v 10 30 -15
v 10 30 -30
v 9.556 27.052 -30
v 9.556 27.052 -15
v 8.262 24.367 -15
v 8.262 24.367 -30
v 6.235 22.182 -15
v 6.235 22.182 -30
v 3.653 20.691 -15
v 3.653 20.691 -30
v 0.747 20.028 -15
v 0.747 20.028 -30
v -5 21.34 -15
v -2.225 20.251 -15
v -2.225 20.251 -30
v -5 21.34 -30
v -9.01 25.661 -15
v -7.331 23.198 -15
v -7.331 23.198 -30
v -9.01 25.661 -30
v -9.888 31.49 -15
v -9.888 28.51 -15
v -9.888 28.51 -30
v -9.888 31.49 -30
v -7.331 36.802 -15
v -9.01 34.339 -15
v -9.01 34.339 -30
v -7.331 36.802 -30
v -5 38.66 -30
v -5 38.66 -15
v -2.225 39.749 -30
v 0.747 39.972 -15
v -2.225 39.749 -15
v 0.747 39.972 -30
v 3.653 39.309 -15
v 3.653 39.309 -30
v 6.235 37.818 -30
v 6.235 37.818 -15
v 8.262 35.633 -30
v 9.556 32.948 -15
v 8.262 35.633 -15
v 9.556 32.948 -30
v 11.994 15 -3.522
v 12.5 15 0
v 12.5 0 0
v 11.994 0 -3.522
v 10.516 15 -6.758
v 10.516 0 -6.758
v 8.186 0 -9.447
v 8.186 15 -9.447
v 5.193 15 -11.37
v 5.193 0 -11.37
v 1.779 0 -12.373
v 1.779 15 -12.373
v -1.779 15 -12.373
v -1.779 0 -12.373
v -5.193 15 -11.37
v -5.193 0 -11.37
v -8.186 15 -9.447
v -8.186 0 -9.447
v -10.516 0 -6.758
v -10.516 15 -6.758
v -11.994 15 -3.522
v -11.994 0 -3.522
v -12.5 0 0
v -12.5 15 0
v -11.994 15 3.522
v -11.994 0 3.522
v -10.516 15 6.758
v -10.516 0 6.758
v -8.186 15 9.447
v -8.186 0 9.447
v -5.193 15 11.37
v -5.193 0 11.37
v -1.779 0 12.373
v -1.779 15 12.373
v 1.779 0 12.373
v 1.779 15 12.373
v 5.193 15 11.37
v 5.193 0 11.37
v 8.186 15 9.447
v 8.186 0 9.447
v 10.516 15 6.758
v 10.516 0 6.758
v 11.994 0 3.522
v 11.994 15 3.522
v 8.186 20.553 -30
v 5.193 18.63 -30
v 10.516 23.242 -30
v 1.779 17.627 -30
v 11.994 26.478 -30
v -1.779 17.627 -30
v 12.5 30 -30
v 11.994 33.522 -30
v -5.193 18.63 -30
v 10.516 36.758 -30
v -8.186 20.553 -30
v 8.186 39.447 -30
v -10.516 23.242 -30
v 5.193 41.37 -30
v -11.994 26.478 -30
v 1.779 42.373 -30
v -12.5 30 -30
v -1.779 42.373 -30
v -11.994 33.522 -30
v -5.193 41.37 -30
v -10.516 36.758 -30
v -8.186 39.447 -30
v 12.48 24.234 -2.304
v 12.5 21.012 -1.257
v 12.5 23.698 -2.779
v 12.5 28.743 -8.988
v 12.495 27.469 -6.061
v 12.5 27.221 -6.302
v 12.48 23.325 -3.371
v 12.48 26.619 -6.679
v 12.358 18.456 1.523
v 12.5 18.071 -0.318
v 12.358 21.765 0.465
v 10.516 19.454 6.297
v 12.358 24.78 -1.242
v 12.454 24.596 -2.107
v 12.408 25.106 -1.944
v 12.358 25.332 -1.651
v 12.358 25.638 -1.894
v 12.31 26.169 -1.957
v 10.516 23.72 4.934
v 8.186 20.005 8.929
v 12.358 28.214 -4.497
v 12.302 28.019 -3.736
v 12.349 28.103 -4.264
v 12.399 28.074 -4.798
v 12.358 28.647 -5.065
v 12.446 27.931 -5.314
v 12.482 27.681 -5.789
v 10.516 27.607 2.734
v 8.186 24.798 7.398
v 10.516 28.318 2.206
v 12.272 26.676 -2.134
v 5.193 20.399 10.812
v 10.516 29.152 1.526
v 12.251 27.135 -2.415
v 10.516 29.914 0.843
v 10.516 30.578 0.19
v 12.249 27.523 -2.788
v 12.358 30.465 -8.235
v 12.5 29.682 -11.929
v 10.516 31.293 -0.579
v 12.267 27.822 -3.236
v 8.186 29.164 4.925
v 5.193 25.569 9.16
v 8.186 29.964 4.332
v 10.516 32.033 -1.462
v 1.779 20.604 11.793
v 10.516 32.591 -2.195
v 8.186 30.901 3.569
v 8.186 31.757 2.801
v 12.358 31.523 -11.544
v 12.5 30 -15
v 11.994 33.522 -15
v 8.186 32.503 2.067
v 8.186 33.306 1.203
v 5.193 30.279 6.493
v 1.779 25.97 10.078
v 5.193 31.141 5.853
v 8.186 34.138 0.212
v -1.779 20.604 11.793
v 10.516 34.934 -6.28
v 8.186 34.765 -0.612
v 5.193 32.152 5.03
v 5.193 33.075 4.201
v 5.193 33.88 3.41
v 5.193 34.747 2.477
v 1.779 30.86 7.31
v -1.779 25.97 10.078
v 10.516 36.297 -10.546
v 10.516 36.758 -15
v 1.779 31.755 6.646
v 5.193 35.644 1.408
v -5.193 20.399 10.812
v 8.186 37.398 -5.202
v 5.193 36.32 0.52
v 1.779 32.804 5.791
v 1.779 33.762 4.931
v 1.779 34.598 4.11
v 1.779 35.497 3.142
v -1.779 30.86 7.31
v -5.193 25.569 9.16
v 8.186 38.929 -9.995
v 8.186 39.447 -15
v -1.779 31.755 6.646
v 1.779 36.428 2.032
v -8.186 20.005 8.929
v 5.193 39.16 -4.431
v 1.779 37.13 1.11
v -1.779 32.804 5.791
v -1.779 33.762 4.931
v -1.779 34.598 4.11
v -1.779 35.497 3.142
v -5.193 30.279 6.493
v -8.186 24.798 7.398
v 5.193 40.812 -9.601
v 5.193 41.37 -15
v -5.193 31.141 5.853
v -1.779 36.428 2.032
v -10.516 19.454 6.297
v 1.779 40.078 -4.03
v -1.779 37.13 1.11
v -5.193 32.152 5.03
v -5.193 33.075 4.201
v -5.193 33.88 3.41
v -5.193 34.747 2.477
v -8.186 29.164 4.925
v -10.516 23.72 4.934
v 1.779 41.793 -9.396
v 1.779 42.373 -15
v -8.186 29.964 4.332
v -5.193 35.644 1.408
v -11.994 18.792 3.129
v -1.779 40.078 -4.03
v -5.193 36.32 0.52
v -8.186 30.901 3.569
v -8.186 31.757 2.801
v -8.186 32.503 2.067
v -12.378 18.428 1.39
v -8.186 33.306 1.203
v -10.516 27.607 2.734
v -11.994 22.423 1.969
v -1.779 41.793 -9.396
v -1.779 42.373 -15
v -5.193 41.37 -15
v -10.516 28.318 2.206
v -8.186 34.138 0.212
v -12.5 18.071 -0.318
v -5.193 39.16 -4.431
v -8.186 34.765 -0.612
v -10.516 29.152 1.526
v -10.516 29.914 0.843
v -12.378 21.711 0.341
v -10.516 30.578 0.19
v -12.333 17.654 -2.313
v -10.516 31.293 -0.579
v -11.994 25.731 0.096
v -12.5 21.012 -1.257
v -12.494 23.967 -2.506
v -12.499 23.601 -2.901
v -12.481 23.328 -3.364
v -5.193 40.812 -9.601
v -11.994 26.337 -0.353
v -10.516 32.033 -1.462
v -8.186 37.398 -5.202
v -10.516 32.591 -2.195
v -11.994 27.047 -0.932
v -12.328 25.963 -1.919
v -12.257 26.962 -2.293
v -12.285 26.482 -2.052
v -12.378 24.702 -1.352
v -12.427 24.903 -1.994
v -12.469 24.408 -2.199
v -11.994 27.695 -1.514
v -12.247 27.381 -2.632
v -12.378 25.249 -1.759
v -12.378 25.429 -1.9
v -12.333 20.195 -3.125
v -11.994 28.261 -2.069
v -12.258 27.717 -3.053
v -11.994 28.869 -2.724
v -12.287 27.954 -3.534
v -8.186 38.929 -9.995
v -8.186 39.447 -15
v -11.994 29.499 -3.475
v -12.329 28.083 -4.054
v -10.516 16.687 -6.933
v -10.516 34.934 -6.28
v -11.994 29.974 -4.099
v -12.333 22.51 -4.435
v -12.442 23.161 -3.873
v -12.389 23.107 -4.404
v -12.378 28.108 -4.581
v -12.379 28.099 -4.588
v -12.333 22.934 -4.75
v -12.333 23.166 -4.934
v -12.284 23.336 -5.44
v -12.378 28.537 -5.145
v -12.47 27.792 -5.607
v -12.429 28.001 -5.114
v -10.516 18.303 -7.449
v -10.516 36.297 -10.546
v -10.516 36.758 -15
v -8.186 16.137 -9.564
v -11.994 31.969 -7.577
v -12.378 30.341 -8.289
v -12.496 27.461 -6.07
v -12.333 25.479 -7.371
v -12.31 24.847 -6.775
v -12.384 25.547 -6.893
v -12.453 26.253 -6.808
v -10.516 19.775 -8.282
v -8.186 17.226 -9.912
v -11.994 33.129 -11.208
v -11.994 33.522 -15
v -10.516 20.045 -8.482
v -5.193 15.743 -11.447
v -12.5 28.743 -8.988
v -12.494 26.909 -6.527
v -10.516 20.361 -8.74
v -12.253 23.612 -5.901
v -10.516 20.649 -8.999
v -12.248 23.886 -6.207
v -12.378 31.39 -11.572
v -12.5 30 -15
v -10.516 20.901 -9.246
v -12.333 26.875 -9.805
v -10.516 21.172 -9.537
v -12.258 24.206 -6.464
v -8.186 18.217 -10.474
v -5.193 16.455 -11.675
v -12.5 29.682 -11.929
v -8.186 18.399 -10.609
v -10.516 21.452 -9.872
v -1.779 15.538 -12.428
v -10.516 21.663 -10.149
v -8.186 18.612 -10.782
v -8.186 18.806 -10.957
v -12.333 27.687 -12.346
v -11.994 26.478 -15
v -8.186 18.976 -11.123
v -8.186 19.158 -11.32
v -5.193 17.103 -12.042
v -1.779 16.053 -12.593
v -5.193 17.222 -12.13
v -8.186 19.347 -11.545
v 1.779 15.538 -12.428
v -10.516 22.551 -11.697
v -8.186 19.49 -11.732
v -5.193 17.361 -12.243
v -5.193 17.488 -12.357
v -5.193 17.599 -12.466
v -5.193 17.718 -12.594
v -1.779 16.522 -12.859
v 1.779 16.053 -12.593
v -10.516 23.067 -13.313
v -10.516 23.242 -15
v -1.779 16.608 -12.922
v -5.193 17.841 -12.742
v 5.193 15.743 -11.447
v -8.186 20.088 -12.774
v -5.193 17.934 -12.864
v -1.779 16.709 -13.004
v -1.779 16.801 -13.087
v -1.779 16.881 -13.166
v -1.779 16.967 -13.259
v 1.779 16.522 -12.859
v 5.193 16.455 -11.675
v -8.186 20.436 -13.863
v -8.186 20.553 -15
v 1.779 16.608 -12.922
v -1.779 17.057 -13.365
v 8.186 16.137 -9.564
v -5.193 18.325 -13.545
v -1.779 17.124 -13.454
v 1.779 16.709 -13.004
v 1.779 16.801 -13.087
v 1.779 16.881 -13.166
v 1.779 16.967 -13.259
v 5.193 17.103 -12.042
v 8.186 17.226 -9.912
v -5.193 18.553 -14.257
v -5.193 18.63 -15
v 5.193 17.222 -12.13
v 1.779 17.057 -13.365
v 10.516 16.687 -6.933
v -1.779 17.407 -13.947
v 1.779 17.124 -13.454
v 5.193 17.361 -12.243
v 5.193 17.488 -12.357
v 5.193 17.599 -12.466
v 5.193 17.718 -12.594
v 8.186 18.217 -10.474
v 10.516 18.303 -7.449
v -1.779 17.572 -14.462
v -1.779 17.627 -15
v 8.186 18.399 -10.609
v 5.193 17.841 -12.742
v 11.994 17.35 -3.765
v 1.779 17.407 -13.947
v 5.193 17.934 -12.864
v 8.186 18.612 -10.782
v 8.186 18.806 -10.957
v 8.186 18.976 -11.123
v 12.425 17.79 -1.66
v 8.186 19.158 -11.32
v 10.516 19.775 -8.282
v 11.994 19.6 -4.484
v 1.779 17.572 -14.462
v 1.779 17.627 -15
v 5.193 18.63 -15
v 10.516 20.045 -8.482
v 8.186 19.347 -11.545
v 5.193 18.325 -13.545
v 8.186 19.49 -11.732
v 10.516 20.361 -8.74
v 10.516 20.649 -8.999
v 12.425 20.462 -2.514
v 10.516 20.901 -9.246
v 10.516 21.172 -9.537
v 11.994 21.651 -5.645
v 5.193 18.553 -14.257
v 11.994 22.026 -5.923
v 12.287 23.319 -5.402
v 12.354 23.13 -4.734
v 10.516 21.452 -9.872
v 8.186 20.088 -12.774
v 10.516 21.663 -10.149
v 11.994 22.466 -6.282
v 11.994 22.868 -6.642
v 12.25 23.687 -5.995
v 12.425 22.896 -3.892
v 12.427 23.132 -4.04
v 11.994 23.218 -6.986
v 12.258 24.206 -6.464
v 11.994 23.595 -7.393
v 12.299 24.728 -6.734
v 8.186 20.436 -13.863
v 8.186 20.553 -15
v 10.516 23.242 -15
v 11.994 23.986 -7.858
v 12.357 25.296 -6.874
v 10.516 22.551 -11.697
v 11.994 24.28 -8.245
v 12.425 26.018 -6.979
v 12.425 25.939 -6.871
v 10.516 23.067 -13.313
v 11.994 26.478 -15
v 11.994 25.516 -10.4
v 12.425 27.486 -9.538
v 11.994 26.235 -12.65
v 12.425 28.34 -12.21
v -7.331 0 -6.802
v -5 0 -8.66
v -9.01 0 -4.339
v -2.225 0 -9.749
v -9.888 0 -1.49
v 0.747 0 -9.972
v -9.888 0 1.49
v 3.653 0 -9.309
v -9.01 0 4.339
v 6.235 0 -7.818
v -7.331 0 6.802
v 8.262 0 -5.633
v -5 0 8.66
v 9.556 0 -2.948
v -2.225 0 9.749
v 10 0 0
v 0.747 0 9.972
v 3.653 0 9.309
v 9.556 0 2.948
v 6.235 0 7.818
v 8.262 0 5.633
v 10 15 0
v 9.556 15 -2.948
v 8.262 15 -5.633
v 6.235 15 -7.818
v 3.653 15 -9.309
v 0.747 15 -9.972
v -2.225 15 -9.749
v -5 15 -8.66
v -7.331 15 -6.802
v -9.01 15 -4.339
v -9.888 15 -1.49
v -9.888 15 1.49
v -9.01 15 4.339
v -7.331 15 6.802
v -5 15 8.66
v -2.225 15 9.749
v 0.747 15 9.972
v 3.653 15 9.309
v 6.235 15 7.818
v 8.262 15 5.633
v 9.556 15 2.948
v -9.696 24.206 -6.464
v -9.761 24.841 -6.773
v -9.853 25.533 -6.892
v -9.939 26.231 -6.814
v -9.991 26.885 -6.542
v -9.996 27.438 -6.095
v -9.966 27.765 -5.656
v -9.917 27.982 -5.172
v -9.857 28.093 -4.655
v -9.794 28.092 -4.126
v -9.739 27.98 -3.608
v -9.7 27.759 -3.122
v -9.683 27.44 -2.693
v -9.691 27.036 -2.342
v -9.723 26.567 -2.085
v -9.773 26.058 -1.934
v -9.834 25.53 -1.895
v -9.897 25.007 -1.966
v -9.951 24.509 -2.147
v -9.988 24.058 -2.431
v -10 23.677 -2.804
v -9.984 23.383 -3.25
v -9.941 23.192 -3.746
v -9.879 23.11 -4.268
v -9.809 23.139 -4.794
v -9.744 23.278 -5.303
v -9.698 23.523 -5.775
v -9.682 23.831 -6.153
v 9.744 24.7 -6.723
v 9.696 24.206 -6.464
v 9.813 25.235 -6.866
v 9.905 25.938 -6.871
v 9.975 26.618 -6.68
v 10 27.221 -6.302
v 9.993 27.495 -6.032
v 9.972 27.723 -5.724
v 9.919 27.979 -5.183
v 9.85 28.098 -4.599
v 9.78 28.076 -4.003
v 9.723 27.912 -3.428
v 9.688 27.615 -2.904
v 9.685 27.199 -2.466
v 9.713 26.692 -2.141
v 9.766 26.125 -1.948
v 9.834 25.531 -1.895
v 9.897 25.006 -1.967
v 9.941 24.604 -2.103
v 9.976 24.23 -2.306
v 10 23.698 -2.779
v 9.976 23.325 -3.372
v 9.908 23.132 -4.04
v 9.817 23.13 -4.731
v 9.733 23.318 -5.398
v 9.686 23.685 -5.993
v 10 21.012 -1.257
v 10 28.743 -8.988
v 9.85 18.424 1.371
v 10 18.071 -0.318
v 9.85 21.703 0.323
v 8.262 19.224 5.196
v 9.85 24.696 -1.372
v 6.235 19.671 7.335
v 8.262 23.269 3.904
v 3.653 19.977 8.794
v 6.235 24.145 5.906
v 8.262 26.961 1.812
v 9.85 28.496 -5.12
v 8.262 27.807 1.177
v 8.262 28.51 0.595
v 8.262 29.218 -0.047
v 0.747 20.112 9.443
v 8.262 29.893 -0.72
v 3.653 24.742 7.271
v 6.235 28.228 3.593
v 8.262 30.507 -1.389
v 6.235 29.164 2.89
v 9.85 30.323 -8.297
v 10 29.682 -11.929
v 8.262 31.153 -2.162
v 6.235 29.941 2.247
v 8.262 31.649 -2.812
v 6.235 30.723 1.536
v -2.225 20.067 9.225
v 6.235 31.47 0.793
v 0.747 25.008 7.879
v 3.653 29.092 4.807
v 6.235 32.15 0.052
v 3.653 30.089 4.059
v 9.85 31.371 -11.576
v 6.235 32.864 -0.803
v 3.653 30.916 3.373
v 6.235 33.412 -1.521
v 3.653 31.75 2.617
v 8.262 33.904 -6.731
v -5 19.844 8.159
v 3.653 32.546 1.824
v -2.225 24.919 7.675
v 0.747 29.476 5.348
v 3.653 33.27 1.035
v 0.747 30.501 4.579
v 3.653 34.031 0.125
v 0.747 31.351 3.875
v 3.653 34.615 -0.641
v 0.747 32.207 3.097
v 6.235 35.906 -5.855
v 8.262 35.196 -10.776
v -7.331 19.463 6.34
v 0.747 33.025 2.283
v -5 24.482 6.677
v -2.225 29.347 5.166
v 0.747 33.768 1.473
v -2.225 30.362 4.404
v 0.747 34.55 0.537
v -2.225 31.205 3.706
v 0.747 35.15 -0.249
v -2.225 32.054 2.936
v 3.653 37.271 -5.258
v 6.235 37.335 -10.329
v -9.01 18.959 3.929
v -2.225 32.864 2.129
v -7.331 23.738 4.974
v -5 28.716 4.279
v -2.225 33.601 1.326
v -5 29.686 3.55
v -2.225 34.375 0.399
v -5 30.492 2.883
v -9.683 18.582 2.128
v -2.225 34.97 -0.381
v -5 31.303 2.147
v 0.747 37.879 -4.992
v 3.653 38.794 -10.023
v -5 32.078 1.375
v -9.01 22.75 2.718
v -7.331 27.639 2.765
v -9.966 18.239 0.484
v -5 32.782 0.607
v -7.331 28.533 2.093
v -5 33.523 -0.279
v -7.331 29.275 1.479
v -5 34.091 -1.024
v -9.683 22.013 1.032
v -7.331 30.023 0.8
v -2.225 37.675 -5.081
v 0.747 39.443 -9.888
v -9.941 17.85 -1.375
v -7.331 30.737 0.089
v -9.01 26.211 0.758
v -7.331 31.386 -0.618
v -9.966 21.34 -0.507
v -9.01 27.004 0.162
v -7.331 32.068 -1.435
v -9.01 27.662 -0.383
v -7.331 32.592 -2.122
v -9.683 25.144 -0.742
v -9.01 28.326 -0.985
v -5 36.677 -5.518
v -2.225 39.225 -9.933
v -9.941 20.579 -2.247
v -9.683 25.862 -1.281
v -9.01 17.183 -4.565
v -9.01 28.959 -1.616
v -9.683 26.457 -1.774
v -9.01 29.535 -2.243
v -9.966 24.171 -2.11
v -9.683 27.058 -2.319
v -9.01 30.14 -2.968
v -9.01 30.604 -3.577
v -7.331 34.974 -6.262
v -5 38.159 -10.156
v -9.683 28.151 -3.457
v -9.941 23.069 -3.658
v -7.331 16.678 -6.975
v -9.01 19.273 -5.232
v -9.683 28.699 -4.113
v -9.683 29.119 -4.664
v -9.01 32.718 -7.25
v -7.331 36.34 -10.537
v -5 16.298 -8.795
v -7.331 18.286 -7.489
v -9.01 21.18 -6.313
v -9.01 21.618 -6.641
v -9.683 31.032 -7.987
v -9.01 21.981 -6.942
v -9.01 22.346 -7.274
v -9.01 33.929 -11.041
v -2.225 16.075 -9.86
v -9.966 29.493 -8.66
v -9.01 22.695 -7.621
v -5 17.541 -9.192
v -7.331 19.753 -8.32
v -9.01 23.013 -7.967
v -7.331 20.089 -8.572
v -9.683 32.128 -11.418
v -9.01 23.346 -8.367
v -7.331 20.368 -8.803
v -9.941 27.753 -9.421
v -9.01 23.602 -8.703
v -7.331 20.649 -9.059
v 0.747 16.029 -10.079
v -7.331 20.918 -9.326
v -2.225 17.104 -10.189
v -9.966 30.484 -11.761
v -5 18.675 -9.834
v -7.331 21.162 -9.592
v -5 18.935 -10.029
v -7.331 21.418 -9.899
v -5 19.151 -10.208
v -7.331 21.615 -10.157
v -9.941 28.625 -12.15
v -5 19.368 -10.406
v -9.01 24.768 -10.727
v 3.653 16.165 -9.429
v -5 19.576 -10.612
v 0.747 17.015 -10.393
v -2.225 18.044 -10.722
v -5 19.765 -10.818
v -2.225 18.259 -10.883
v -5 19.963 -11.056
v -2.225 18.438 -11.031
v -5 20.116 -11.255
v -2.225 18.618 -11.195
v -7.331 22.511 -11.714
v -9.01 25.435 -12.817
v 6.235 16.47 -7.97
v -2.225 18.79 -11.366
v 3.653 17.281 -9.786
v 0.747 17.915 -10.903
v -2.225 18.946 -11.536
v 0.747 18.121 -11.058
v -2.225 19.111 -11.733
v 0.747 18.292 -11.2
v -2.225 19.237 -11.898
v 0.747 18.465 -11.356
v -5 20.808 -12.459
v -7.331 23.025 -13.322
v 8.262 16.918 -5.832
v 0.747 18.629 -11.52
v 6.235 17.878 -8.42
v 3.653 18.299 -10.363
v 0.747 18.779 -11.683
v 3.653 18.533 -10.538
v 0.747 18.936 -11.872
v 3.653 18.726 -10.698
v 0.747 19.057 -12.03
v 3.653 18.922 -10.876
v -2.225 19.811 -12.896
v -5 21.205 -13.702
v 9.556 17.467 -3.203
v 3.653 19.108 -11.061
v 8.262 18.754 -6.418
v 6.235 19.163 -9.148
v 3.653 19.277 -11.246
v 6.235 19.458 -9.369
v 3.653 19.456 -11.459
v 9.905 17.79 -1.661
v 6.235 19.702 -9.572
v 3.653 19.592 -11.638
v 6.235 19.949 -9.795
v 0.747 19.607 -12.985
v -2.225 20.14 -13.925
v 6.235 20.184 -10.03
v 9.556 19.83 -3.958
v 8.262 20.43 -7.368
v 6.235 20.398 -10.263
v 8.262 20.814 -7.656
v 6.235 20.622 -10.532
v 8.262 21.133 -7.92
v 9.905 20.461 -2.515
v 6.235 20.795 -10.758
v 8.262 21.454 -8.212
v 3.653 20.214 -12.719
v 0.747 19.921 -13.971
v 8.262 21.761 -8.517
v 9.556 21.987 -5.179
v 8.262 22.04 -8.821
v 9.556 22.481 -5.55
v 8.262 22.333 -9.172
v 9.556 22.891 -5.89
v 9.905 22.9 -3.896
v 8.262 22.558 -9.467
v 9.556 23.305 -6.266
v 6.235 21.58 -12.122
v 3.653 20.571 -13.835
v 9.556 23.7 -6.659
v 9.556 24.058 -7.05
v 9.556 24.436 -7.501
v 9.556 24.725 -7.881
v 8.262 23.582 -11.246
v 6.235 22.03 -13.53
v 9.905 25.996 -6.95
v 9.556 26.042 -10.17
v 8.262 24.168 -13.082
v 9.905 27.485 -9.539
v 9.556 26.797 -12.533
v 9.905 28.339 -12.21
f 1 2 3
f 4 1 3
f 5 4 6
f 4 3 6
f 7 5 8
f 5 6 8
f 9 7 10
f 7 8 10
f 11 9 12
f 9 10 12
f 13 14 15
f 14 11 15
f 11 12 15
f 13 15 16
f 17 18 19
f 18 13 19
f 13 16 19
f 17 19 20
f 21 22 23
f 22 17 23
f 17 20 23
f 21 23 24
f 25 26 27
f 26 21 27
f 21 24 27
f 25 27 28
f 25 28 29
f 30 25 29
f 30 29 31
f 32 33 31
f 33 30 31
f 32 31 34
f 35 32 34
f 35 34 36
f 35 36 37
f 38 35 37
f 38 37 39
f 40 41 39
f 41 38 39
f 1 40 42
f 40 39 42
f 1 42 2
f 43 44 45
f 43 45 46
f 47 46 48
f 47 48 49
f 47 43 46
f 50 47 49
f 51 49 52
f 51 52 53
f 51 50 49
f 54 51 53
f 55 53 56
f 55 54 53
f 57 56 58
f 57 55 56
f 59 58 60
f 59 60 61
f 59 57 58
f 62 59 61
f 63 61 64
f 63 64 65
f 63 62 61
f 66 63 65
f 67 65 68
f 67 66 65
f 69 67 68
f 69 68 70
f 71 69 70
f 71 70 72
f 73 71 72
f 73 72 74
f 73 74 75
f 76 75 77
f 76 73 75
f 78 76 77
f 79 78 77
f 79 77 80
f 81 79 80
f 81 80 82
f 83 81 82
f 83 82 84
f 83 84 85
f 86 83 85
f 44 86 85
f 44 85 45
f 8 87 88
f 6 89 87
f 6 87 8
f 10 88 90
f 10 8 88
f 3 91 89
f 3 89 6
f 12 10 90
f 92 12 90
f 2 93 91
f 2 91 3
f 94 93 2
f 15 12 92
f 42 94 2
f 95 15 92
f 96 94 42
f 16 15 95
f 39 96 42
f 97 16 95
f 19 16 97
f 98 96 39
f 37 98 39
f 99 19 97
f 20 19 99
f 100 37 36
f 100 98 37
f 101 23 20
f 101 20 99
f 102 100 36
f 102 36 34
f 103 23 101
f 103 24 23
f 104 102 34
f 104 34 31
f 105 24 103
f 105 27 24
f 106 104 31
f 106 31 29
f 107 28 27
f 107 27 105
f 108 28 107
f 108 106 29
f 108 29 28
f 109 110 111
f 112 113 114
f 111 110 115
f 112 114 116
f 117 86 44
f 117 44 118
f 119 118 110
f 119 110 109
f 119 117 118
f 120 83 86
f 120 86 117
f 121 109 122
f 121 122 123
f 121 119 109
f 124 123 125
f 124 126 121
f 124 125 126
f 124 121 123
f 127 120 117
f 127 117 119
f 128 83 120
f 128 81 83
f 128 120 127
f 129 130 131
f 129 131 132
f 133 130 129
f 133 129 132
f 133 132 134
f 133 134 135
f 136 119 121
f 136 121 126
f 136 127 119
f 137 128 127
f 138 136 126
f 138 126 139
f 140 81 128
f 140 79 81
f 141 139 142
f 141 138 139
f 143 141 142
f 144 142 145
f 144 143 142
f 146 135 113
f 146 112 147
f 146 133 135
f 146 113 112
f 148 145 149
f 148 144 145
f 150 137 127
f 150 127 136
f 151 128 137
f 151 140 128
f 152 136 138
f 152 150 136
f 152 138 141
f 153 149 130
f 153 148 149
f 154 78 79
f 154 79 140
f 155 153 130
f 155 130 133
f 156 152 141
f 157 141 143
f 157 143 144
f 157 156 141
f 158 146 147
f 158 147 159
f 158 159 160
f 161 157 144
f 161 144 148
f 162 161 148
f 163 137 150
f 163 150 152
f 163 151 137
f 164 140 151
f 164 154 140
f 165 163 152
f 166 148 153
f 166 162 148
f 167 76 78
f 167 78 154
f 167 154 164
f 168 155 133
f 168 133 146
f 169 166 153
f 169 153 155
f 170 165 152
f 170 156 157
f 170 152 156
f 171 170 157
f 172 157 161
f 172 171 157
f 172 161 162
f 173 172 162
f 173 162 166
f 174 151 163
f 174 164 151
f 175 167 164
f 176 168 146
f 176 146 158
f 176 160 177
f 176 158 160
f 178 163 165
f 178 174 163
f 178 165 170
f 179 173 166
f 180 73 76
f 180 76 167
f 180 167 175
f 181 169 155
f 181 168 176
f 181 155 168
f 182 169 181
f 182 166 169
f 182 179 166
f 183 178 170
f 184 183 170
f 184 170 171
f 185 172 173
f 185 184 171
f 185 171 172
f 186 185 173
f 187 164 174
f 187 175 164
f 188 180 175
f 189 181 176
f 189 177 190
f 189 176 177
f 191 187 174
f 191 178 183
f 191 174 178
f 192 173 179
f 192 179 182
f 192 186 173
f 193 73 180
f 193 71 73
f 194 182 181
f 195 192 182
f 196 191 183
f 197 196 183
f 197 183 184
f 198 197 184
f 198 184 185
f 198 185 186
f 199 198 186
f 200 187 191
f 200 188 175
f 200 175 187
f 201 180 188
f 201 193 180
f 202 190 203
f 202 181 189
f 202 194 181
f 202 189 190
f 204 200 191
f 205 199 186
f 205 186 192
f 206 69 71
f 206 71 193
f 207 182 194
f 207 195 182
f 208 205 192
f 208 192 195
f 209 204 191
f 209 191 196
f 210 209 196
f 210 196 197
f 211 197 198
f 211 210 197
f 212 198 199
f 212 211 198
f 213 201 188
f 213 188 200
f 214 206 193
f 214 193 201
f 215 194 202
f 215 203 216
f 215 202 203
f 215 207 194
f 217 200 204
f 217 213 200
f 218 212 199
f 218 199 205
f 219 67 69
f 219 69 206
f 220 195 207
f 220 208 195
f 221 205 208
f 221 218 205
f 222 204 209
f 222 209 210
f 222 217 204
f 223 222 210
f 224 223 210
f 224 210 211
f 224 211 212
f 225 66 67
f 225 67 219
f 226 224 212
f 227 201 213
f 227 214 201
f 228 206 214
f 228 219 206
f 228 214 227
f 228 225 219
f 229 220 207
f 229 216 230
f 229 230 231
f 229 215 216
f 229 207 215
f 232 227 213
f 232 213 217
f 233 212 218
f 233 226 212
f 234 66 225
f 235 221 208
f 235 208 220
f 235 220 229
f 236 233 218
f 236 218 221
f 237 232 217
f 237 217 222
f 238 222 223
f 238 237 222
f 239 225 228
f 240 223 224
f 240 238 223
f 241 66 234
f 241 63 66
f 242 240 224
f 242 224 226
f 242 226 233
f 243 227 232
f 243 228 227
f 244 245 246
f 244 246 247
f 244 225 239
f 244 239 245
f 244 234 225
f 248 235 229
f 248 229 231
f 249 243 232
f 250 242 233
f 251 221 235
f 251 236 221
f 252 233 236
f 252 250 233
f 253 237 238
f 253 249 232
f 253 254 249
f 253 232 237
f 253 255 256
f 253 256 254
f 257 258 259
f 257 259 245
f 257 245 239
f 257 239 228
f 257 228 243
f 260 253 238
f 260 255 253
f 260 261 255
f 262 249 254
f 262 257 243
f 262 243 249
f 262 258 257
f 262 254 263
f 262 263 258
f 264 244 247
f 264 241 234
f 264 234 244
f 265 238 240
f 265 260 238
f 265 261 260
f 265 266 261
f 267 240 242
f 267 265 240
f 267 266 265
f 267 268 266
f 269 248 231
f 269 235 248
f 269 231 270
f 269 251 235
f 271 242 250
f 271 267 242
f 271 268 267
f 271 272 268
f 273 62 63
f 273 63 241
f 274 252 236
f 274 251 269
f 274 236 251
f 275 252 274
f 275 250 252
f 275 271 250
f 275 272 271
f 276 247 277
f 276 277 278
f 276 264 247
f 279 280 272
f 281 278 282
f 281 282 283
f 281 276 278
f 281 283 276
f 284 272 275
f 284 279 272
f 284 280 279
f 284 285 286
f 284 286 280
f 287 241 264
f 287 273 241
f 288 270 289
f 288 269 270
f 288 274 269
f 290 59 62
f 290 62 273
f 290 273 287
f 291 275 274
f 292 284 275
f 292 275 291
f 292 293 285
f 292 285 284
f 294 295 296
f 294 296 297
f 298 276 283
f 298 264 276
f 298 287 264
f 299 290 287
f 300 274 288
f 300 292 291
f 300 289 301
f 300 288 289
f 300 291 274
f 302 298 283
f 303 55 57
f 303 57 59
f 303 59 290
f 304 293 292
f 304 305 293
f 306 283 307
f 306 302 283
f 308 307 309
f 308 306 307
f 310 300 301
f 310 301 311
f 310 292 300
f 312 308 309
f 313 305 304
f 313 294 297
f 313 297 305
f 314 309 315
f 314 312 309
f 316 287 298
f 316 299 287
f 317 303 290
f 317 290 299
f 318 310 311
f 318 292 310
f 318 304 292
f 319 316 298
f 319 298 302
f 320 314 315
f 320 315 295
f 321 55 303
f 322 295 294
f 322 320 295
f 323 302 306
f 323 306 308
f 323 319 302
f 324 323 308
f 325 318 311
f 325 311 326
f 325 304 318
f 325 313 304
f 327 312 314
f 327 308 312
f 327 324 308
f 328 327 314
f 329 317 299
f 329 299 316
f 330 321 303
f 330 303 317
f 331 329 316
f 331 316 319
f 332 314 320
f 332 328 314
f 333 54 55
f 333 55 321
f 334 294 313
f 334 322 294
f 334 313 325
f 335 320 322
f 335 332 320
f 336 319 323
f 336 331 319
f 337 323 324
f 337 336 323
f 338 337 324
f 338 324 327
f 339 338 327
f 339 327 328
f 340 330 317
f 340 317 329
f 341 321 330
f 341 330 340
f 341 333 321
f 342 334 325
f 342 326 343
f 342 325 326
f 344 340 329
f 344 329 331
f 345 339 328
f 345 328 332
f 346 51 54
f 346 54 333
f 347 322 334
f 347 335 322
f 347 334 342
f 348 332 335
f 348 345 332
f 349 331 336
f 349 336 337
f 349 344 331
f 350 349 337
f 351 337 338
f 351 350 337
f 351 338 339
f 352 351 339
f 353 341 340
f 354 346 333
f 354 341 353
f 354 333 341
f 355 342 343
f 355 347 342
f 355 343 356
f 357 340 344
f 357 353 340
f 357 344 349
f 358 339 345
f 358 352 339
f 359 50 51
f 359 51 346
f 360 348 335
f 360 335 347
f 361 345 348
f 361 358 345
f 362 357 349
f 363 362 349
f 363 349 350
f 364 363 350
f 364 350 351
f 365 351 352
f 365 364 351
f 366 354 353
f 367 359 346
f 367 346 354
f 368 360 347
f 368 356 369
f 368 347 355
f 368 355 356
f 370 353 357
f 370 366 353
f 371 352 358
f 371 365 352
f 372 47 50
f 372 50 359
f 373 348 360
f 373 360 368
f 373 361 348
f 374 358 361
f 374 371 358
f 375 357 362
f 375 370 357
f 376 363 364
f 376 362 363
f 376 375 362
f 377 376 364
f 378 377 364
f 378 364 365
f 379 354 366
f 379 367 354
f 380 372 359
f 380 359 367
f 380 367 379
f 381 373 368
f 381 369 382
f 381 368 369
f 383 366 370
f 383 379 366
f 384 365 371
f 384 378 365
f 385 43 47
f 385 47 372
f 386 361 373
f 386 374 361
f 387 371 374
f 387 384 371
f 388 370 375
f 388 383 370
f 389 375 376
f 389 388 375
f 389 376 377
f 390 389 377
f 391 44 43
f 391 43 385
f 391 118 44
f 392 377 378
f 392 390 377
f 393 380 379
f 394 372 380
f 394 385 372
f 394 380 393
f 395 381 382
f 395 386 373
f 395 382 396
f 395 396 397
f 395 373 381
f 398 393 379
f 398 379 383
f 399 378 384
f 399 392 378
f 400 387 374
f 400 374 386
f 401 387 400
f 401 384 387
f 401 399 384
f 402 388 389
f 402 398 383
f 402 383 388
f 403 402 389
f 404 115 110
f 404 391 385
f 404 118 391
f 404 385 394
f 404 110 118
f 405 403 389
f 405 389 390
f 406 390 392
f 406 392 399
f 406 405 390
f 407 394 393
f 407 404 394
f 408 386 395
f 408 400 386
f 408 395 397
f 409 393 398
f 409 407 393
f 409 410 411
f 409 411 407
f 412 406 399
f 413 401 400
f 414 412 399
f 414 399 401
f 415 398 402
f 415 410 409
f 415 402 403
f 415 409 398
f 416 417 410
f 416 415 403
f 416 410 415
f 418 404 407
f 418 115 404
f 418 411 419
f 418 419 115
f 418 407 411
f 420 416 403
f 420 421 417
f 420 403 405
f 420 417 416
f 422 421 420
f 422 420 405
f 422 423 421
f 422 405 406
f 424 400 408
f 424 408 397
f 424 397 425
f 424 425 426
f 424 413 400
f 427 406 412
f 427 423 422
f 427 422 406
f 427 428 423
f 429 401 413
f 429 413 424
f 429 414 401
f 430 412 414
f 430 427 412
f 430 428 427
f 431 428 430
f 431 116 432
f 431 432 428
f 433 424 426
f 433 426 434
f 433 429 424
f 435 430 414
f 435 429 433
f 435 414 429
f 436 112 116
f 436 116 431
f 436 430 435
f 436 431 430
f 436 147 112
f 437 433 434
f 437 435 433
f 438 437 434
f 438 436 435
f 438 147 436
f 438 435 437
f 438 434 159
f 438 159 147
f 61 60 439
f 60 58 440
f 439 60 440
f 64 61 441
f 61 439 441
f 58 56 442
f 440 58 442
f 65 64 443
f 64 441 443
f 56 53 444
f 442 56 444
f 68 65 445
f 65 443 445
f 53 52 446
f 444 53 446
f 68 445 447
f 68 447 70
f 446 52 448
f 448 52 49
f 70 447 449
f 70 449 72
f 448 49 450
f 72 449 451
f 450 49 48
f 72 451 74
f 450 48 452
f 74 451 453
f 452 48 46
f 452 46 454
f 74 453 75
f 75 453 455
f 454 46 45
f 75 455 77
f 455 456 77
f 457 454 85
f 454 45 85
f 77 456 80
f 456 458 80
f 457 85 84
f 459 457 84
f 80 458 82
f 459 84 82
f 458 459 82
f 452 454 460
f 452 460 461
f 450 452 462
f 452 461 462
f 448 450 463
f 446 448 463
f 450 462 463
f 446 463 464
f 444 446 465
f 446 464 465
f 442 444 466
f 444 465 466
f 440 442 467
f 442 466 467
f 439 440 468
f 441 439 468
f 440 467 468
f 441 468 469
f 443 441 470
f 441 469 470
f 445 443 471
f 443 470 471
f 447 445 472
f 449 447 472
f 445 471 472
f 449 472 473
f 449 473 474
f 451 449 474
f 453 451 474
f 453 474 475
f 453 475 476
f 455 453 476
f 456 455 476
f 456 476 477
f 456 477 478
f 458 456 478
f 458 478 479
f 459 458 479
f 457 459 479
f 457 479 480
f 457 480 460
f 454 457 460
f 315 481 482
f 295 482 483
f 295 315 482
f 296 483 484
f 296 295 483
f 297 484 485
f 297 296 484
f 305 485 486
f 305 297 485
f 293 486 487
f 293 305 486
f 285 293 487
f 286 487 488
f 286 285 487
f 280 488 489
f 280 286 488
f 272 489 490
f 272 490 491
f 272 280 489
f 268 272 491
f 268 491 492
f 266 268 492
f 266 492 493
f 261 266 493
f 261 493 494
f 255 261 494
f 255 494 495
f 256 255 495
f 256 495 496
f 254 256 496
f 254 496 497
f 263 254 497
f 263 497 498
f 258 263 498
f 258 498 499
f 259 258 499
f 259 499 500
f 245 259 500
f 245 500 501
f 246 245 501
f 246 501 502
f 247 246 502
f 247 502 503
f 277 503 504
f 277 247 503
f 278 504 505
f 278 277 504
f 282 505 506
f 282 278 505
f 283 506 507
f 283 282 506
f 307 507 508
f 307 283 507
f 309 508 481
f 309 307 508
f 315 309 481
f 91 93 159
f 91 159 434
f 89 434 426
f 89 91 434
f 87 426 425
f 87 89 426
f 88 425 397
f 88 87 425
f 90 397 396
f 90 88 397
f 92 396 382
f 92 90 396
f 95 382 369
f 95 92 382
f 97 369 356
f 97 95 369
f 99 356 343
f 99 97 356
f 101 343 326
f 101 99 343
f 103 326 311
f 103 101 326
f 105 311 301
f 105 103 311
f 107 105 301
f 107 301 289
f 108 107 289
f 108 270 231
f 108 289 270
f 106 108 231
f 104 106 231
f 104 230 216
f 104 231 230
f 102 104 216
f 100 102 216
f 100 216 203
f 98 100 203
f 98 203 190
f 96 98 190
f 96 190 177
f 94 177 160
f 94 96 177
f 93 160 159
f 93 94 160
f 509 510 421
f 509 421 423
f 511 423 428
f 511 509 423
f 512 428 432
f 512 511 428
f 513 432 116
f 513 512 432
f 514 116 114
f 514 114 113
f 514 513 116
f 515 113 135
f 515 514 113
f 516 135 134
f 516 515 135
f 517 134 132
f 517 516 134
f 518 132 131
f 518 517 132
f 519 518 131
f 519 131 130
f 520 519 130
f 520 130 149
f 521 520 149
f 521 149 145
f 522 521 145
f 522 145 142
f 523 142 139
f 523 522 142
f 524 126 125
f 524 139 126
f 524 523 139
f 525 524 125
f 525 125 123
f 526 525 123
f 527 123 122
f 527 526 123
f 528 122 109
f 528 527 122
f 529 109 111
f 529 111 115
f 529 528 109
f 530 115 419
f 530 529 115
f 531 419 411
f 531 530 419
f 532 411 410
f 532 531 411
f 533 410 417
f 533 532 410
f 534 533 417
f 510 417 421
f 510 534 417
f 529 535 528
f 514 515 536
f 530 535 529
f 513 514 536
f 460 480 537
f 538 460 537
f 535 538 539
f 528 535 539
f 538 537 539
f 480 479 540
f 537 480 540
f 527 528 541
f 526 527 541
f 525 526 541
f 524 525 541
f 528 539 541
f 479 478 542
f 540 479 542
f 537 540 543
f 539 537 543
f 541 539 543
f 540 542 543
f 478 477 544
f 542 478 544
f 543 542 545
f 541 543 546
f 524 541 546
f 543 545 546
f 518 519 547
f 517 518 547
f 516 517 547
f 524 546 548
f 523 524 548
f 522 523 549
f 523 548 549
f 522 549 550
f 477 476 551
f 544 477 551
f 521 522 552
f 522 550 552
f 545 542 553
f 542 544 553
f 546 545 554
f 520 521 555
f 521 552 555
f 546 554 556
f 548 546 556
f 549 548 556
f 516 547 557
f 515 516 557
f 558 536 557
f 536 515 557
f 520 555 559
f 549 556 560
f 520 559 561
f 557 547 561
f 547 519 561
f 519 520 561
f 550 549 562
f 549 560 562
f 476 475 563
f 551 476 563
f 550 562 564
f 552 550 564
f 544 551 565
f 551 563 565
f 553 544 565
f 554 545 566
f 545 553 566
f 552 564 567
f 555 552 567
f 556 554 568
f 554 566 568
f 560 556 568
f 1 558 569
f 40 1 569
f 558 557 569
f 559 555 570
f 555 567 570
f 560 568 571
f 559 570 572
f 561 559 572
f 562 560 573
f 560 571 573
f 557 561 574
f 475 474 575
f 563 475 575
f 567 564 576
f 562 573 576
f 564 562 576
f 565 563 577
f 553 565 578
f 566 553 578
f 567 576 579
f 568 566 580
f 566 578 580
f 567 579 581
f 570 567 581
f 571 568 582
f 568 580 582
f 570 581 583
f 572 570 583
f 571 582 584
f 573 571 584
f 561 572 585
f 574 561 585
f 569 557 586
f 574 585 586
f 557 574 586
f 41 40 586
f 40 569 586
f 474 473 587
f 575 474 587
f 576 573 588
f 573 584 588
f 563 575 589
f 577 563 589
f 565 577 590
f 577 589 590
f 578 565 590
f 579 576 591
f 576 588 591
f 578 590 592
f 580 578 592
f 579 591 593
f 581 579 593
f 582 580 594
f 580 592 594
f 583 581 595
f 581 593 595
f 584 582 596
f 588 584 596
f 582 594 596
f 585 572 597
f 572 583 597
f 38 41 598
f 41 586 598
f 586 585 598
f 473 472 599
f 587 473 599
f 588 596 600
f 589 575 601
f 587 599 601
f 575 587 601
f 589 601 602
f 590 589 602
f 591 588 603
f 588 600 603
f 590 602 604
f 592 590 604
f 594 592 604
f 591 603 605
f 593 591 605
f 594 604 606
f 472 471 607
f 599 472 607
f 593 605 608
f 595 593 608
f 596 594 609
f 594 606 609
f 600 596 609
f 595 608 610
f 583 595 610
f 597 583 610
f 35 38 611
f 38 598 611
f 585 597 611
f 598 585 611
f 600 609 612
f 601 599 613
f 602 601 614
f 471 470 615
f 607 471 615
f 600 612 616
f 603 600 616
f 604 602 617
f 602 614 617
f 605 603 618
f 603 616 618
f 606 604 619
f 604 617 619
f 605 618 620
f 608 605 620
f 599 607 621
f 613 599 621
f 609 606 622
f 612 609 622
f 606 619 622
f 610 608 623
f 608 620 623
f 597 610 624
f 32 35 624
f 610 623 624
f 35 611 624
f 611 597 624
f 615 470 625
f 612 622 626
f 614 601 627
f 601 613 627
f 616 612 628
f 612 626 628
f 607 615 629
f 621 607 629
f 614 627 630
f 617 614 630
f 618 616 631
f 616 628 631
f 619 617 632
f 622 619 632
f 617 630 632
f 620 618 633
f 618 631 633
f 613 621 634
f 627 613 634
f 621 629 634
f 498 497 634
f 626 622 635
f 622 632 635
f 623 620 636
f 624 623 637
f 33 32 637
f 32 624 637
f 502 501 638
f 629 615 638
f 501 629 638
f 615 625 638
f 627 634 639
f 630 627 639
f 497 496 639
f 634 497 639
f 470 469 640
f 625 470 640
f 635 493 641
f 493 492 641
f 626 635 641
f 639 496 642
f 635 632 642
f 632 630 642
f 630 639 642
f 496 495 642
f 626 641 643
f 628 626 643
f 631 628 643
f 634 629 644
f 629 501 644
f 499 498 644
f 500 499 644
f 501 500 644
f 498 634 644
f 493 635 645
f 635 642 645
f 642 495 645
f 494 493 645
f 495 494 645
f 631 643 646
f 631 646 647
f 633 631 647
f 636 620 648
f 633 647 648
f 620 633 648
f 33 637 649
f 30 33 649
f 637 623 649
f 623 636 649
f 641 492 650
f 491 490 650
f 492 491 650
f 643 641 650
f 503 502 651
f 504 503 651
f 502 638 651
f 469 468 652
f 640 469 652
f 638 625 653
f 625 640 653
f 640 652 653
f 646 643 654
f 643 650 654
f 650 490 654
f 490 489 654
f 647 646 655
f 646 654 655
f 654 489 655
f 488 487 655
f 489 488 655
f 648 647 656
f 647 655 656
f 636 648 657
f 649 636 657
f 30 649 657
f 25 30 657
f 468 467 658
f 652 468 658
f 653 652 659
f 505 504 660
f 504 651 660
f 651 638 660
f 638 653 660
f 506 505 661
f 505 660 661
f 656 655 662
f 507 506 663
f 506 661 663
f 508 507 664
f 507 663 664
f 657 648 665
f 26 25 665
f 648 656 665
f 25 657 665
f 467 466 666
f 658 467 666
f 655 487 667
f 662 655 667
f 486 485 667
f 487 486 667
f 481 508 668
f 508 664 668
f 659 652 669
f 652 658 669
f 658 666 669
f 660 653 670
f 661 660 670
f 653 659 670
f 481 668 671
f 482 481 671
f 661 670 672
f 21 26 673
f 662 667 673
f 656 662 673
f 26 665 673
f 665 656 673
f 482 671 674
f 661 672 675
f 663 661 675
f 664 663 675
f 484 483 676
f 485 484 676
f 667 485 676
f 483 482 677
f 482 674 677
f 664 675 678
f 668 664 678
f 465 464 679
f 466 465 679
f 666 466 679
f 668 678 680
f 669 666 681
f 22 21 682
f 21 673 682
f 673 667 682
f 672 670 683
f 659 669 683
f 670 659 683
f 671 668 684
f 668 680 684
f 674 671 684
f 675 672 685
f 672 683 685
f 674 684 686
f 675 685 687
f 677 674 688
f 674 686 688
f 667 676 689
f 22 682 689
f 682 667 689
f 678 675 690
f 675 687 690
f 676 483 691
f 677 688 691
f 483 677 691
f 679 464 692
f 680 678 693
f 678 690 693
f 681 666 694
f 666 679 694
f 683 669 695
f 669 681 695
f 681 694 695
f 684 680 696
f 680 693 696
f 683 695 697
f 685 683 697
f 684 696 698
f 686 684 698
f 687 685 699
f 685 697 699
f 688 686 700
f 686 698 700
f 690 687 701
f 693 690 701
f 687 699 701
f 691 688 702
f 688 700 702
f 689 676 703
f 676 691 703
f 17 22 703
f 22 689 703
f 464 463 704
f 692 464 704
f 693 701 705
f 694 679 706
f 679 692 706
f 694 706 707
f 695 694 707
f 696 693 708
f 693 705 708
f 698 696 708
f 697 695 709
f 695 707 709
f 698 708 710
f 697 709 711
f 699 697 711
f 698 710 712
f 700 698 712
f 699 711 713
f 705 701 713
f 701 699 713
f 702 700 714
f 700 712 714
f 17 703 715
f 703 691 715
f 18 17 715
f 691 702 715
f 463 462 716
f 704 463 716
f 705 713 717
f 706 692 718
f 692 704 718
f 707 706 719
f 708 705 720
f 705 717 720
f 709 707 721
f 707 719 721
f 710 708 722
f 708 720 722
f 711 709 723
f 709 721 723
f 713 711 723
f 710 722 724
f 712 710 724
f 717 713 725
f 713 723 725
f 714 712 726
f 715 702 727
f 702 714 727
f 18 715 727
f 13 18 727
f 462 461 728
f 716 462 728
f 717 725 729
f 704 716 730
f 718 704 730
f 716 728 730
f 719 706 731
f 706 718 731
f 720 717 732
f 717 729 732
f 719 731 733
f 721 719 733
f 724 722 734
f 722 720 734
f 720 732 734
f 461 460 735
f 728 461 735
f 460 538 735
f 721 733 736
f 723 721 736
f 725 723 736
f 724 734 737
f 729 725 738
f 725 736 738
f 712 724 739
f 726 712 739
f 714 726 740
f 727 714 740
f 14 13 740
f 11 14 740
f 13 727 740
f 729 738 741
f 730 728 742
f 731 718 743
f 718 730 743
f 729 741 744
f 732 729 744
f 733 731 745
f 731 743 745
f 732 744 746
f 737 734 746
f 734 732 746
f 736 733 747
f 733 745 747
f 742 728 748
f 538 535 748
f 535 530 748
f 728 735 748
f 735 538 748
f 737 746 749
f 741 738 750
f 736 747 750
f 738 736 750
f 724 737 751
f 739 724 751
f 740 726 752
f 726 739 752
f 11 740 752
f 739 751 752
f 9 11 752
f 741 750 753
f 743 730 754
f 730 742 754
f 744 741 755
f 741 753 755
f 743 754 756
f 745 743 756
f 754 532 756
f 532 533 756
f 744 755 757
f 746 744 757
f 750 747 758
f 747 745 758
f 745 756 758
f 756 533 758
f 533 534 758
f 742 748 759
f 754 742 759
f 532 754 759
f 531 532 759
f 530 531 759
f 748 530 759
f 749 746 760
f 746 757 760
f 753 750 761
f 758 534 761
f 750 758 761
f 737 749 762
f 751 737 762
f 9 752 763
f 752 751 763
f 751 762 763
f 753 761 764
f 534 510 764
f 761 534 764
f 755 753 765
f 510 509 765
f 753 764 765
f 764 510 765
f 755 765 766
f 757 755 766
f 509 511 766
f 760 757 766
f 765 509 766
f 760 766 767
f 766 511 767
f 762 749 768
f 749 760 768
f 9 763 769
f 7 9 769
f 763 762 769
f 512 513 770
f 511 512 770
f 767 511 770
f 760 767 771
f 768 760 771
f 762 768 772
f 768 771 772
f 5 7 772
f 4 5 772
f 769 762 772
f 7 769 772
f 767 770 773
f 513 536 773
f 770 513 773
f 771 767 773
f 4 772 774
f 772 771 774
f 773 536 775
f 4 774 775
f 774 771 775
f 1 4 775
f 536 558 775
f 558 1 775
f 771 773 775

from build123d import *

# Parameters (mm, degrees)
ESBO_O4_R                  = 12.5
ESBO_O4_R_2                = 10
CORTE_EXTRUS_O1_DEPTH      = 22
CORTE_EXTRUS_O1_DEPTH_BACK = 23
ESBO_O5_R                  = 2.5


with BuildPart() as part:
    # Varredura1: sweep along a path in Esboço3
    with BuildLine(Plane(origin=(0, 0, 0), x_dir=(0, 0, -1), z_dir=(1, 0, 0))) as varredura1_path:
        Line((0, 0), (0, 15))
        ThreePointArc((0, 15), (4.393398282, 25.606601718), (15, 30))
        Line((15, 30), (30, 30))
    # Esboço4 → Varredura1 (sweep)
    with BuildSketch(Plane(origin=(0, 0, 0), x_dir=(1, 0, 0), z_dir=(0, 1, 0))):
        Circle(ESBO_O4_R)
        Circle(ESBO_O4_R_2, mode=Mode.SUBTRACT)
    sweep(path=varredura1_path.line)

    # Esboço5 → Corte-extrusão1 (cut, two sides: drawn at the far end of the back side and taken through both)
    with BuildSketch(Plane(origin=(0, 0, 0), x_dir=(0, 0, -1), z_dir=(1, 0, 0)).offset(-CORTE_EXTRUS_O1_DEPTH_BACK)):
        with Locations(Location((4.393398282, 25.606601718, 0), (0, 0, 325.914839644))):
            Circle(ESBO_O5_R)
    extrude(amount=CORTE_EXTRUS_O1_DEPTH + CORTE_EXTRUS_O1_DEPTH_BACK, mode=Mode.SUBTRACT)


solid = part.part
